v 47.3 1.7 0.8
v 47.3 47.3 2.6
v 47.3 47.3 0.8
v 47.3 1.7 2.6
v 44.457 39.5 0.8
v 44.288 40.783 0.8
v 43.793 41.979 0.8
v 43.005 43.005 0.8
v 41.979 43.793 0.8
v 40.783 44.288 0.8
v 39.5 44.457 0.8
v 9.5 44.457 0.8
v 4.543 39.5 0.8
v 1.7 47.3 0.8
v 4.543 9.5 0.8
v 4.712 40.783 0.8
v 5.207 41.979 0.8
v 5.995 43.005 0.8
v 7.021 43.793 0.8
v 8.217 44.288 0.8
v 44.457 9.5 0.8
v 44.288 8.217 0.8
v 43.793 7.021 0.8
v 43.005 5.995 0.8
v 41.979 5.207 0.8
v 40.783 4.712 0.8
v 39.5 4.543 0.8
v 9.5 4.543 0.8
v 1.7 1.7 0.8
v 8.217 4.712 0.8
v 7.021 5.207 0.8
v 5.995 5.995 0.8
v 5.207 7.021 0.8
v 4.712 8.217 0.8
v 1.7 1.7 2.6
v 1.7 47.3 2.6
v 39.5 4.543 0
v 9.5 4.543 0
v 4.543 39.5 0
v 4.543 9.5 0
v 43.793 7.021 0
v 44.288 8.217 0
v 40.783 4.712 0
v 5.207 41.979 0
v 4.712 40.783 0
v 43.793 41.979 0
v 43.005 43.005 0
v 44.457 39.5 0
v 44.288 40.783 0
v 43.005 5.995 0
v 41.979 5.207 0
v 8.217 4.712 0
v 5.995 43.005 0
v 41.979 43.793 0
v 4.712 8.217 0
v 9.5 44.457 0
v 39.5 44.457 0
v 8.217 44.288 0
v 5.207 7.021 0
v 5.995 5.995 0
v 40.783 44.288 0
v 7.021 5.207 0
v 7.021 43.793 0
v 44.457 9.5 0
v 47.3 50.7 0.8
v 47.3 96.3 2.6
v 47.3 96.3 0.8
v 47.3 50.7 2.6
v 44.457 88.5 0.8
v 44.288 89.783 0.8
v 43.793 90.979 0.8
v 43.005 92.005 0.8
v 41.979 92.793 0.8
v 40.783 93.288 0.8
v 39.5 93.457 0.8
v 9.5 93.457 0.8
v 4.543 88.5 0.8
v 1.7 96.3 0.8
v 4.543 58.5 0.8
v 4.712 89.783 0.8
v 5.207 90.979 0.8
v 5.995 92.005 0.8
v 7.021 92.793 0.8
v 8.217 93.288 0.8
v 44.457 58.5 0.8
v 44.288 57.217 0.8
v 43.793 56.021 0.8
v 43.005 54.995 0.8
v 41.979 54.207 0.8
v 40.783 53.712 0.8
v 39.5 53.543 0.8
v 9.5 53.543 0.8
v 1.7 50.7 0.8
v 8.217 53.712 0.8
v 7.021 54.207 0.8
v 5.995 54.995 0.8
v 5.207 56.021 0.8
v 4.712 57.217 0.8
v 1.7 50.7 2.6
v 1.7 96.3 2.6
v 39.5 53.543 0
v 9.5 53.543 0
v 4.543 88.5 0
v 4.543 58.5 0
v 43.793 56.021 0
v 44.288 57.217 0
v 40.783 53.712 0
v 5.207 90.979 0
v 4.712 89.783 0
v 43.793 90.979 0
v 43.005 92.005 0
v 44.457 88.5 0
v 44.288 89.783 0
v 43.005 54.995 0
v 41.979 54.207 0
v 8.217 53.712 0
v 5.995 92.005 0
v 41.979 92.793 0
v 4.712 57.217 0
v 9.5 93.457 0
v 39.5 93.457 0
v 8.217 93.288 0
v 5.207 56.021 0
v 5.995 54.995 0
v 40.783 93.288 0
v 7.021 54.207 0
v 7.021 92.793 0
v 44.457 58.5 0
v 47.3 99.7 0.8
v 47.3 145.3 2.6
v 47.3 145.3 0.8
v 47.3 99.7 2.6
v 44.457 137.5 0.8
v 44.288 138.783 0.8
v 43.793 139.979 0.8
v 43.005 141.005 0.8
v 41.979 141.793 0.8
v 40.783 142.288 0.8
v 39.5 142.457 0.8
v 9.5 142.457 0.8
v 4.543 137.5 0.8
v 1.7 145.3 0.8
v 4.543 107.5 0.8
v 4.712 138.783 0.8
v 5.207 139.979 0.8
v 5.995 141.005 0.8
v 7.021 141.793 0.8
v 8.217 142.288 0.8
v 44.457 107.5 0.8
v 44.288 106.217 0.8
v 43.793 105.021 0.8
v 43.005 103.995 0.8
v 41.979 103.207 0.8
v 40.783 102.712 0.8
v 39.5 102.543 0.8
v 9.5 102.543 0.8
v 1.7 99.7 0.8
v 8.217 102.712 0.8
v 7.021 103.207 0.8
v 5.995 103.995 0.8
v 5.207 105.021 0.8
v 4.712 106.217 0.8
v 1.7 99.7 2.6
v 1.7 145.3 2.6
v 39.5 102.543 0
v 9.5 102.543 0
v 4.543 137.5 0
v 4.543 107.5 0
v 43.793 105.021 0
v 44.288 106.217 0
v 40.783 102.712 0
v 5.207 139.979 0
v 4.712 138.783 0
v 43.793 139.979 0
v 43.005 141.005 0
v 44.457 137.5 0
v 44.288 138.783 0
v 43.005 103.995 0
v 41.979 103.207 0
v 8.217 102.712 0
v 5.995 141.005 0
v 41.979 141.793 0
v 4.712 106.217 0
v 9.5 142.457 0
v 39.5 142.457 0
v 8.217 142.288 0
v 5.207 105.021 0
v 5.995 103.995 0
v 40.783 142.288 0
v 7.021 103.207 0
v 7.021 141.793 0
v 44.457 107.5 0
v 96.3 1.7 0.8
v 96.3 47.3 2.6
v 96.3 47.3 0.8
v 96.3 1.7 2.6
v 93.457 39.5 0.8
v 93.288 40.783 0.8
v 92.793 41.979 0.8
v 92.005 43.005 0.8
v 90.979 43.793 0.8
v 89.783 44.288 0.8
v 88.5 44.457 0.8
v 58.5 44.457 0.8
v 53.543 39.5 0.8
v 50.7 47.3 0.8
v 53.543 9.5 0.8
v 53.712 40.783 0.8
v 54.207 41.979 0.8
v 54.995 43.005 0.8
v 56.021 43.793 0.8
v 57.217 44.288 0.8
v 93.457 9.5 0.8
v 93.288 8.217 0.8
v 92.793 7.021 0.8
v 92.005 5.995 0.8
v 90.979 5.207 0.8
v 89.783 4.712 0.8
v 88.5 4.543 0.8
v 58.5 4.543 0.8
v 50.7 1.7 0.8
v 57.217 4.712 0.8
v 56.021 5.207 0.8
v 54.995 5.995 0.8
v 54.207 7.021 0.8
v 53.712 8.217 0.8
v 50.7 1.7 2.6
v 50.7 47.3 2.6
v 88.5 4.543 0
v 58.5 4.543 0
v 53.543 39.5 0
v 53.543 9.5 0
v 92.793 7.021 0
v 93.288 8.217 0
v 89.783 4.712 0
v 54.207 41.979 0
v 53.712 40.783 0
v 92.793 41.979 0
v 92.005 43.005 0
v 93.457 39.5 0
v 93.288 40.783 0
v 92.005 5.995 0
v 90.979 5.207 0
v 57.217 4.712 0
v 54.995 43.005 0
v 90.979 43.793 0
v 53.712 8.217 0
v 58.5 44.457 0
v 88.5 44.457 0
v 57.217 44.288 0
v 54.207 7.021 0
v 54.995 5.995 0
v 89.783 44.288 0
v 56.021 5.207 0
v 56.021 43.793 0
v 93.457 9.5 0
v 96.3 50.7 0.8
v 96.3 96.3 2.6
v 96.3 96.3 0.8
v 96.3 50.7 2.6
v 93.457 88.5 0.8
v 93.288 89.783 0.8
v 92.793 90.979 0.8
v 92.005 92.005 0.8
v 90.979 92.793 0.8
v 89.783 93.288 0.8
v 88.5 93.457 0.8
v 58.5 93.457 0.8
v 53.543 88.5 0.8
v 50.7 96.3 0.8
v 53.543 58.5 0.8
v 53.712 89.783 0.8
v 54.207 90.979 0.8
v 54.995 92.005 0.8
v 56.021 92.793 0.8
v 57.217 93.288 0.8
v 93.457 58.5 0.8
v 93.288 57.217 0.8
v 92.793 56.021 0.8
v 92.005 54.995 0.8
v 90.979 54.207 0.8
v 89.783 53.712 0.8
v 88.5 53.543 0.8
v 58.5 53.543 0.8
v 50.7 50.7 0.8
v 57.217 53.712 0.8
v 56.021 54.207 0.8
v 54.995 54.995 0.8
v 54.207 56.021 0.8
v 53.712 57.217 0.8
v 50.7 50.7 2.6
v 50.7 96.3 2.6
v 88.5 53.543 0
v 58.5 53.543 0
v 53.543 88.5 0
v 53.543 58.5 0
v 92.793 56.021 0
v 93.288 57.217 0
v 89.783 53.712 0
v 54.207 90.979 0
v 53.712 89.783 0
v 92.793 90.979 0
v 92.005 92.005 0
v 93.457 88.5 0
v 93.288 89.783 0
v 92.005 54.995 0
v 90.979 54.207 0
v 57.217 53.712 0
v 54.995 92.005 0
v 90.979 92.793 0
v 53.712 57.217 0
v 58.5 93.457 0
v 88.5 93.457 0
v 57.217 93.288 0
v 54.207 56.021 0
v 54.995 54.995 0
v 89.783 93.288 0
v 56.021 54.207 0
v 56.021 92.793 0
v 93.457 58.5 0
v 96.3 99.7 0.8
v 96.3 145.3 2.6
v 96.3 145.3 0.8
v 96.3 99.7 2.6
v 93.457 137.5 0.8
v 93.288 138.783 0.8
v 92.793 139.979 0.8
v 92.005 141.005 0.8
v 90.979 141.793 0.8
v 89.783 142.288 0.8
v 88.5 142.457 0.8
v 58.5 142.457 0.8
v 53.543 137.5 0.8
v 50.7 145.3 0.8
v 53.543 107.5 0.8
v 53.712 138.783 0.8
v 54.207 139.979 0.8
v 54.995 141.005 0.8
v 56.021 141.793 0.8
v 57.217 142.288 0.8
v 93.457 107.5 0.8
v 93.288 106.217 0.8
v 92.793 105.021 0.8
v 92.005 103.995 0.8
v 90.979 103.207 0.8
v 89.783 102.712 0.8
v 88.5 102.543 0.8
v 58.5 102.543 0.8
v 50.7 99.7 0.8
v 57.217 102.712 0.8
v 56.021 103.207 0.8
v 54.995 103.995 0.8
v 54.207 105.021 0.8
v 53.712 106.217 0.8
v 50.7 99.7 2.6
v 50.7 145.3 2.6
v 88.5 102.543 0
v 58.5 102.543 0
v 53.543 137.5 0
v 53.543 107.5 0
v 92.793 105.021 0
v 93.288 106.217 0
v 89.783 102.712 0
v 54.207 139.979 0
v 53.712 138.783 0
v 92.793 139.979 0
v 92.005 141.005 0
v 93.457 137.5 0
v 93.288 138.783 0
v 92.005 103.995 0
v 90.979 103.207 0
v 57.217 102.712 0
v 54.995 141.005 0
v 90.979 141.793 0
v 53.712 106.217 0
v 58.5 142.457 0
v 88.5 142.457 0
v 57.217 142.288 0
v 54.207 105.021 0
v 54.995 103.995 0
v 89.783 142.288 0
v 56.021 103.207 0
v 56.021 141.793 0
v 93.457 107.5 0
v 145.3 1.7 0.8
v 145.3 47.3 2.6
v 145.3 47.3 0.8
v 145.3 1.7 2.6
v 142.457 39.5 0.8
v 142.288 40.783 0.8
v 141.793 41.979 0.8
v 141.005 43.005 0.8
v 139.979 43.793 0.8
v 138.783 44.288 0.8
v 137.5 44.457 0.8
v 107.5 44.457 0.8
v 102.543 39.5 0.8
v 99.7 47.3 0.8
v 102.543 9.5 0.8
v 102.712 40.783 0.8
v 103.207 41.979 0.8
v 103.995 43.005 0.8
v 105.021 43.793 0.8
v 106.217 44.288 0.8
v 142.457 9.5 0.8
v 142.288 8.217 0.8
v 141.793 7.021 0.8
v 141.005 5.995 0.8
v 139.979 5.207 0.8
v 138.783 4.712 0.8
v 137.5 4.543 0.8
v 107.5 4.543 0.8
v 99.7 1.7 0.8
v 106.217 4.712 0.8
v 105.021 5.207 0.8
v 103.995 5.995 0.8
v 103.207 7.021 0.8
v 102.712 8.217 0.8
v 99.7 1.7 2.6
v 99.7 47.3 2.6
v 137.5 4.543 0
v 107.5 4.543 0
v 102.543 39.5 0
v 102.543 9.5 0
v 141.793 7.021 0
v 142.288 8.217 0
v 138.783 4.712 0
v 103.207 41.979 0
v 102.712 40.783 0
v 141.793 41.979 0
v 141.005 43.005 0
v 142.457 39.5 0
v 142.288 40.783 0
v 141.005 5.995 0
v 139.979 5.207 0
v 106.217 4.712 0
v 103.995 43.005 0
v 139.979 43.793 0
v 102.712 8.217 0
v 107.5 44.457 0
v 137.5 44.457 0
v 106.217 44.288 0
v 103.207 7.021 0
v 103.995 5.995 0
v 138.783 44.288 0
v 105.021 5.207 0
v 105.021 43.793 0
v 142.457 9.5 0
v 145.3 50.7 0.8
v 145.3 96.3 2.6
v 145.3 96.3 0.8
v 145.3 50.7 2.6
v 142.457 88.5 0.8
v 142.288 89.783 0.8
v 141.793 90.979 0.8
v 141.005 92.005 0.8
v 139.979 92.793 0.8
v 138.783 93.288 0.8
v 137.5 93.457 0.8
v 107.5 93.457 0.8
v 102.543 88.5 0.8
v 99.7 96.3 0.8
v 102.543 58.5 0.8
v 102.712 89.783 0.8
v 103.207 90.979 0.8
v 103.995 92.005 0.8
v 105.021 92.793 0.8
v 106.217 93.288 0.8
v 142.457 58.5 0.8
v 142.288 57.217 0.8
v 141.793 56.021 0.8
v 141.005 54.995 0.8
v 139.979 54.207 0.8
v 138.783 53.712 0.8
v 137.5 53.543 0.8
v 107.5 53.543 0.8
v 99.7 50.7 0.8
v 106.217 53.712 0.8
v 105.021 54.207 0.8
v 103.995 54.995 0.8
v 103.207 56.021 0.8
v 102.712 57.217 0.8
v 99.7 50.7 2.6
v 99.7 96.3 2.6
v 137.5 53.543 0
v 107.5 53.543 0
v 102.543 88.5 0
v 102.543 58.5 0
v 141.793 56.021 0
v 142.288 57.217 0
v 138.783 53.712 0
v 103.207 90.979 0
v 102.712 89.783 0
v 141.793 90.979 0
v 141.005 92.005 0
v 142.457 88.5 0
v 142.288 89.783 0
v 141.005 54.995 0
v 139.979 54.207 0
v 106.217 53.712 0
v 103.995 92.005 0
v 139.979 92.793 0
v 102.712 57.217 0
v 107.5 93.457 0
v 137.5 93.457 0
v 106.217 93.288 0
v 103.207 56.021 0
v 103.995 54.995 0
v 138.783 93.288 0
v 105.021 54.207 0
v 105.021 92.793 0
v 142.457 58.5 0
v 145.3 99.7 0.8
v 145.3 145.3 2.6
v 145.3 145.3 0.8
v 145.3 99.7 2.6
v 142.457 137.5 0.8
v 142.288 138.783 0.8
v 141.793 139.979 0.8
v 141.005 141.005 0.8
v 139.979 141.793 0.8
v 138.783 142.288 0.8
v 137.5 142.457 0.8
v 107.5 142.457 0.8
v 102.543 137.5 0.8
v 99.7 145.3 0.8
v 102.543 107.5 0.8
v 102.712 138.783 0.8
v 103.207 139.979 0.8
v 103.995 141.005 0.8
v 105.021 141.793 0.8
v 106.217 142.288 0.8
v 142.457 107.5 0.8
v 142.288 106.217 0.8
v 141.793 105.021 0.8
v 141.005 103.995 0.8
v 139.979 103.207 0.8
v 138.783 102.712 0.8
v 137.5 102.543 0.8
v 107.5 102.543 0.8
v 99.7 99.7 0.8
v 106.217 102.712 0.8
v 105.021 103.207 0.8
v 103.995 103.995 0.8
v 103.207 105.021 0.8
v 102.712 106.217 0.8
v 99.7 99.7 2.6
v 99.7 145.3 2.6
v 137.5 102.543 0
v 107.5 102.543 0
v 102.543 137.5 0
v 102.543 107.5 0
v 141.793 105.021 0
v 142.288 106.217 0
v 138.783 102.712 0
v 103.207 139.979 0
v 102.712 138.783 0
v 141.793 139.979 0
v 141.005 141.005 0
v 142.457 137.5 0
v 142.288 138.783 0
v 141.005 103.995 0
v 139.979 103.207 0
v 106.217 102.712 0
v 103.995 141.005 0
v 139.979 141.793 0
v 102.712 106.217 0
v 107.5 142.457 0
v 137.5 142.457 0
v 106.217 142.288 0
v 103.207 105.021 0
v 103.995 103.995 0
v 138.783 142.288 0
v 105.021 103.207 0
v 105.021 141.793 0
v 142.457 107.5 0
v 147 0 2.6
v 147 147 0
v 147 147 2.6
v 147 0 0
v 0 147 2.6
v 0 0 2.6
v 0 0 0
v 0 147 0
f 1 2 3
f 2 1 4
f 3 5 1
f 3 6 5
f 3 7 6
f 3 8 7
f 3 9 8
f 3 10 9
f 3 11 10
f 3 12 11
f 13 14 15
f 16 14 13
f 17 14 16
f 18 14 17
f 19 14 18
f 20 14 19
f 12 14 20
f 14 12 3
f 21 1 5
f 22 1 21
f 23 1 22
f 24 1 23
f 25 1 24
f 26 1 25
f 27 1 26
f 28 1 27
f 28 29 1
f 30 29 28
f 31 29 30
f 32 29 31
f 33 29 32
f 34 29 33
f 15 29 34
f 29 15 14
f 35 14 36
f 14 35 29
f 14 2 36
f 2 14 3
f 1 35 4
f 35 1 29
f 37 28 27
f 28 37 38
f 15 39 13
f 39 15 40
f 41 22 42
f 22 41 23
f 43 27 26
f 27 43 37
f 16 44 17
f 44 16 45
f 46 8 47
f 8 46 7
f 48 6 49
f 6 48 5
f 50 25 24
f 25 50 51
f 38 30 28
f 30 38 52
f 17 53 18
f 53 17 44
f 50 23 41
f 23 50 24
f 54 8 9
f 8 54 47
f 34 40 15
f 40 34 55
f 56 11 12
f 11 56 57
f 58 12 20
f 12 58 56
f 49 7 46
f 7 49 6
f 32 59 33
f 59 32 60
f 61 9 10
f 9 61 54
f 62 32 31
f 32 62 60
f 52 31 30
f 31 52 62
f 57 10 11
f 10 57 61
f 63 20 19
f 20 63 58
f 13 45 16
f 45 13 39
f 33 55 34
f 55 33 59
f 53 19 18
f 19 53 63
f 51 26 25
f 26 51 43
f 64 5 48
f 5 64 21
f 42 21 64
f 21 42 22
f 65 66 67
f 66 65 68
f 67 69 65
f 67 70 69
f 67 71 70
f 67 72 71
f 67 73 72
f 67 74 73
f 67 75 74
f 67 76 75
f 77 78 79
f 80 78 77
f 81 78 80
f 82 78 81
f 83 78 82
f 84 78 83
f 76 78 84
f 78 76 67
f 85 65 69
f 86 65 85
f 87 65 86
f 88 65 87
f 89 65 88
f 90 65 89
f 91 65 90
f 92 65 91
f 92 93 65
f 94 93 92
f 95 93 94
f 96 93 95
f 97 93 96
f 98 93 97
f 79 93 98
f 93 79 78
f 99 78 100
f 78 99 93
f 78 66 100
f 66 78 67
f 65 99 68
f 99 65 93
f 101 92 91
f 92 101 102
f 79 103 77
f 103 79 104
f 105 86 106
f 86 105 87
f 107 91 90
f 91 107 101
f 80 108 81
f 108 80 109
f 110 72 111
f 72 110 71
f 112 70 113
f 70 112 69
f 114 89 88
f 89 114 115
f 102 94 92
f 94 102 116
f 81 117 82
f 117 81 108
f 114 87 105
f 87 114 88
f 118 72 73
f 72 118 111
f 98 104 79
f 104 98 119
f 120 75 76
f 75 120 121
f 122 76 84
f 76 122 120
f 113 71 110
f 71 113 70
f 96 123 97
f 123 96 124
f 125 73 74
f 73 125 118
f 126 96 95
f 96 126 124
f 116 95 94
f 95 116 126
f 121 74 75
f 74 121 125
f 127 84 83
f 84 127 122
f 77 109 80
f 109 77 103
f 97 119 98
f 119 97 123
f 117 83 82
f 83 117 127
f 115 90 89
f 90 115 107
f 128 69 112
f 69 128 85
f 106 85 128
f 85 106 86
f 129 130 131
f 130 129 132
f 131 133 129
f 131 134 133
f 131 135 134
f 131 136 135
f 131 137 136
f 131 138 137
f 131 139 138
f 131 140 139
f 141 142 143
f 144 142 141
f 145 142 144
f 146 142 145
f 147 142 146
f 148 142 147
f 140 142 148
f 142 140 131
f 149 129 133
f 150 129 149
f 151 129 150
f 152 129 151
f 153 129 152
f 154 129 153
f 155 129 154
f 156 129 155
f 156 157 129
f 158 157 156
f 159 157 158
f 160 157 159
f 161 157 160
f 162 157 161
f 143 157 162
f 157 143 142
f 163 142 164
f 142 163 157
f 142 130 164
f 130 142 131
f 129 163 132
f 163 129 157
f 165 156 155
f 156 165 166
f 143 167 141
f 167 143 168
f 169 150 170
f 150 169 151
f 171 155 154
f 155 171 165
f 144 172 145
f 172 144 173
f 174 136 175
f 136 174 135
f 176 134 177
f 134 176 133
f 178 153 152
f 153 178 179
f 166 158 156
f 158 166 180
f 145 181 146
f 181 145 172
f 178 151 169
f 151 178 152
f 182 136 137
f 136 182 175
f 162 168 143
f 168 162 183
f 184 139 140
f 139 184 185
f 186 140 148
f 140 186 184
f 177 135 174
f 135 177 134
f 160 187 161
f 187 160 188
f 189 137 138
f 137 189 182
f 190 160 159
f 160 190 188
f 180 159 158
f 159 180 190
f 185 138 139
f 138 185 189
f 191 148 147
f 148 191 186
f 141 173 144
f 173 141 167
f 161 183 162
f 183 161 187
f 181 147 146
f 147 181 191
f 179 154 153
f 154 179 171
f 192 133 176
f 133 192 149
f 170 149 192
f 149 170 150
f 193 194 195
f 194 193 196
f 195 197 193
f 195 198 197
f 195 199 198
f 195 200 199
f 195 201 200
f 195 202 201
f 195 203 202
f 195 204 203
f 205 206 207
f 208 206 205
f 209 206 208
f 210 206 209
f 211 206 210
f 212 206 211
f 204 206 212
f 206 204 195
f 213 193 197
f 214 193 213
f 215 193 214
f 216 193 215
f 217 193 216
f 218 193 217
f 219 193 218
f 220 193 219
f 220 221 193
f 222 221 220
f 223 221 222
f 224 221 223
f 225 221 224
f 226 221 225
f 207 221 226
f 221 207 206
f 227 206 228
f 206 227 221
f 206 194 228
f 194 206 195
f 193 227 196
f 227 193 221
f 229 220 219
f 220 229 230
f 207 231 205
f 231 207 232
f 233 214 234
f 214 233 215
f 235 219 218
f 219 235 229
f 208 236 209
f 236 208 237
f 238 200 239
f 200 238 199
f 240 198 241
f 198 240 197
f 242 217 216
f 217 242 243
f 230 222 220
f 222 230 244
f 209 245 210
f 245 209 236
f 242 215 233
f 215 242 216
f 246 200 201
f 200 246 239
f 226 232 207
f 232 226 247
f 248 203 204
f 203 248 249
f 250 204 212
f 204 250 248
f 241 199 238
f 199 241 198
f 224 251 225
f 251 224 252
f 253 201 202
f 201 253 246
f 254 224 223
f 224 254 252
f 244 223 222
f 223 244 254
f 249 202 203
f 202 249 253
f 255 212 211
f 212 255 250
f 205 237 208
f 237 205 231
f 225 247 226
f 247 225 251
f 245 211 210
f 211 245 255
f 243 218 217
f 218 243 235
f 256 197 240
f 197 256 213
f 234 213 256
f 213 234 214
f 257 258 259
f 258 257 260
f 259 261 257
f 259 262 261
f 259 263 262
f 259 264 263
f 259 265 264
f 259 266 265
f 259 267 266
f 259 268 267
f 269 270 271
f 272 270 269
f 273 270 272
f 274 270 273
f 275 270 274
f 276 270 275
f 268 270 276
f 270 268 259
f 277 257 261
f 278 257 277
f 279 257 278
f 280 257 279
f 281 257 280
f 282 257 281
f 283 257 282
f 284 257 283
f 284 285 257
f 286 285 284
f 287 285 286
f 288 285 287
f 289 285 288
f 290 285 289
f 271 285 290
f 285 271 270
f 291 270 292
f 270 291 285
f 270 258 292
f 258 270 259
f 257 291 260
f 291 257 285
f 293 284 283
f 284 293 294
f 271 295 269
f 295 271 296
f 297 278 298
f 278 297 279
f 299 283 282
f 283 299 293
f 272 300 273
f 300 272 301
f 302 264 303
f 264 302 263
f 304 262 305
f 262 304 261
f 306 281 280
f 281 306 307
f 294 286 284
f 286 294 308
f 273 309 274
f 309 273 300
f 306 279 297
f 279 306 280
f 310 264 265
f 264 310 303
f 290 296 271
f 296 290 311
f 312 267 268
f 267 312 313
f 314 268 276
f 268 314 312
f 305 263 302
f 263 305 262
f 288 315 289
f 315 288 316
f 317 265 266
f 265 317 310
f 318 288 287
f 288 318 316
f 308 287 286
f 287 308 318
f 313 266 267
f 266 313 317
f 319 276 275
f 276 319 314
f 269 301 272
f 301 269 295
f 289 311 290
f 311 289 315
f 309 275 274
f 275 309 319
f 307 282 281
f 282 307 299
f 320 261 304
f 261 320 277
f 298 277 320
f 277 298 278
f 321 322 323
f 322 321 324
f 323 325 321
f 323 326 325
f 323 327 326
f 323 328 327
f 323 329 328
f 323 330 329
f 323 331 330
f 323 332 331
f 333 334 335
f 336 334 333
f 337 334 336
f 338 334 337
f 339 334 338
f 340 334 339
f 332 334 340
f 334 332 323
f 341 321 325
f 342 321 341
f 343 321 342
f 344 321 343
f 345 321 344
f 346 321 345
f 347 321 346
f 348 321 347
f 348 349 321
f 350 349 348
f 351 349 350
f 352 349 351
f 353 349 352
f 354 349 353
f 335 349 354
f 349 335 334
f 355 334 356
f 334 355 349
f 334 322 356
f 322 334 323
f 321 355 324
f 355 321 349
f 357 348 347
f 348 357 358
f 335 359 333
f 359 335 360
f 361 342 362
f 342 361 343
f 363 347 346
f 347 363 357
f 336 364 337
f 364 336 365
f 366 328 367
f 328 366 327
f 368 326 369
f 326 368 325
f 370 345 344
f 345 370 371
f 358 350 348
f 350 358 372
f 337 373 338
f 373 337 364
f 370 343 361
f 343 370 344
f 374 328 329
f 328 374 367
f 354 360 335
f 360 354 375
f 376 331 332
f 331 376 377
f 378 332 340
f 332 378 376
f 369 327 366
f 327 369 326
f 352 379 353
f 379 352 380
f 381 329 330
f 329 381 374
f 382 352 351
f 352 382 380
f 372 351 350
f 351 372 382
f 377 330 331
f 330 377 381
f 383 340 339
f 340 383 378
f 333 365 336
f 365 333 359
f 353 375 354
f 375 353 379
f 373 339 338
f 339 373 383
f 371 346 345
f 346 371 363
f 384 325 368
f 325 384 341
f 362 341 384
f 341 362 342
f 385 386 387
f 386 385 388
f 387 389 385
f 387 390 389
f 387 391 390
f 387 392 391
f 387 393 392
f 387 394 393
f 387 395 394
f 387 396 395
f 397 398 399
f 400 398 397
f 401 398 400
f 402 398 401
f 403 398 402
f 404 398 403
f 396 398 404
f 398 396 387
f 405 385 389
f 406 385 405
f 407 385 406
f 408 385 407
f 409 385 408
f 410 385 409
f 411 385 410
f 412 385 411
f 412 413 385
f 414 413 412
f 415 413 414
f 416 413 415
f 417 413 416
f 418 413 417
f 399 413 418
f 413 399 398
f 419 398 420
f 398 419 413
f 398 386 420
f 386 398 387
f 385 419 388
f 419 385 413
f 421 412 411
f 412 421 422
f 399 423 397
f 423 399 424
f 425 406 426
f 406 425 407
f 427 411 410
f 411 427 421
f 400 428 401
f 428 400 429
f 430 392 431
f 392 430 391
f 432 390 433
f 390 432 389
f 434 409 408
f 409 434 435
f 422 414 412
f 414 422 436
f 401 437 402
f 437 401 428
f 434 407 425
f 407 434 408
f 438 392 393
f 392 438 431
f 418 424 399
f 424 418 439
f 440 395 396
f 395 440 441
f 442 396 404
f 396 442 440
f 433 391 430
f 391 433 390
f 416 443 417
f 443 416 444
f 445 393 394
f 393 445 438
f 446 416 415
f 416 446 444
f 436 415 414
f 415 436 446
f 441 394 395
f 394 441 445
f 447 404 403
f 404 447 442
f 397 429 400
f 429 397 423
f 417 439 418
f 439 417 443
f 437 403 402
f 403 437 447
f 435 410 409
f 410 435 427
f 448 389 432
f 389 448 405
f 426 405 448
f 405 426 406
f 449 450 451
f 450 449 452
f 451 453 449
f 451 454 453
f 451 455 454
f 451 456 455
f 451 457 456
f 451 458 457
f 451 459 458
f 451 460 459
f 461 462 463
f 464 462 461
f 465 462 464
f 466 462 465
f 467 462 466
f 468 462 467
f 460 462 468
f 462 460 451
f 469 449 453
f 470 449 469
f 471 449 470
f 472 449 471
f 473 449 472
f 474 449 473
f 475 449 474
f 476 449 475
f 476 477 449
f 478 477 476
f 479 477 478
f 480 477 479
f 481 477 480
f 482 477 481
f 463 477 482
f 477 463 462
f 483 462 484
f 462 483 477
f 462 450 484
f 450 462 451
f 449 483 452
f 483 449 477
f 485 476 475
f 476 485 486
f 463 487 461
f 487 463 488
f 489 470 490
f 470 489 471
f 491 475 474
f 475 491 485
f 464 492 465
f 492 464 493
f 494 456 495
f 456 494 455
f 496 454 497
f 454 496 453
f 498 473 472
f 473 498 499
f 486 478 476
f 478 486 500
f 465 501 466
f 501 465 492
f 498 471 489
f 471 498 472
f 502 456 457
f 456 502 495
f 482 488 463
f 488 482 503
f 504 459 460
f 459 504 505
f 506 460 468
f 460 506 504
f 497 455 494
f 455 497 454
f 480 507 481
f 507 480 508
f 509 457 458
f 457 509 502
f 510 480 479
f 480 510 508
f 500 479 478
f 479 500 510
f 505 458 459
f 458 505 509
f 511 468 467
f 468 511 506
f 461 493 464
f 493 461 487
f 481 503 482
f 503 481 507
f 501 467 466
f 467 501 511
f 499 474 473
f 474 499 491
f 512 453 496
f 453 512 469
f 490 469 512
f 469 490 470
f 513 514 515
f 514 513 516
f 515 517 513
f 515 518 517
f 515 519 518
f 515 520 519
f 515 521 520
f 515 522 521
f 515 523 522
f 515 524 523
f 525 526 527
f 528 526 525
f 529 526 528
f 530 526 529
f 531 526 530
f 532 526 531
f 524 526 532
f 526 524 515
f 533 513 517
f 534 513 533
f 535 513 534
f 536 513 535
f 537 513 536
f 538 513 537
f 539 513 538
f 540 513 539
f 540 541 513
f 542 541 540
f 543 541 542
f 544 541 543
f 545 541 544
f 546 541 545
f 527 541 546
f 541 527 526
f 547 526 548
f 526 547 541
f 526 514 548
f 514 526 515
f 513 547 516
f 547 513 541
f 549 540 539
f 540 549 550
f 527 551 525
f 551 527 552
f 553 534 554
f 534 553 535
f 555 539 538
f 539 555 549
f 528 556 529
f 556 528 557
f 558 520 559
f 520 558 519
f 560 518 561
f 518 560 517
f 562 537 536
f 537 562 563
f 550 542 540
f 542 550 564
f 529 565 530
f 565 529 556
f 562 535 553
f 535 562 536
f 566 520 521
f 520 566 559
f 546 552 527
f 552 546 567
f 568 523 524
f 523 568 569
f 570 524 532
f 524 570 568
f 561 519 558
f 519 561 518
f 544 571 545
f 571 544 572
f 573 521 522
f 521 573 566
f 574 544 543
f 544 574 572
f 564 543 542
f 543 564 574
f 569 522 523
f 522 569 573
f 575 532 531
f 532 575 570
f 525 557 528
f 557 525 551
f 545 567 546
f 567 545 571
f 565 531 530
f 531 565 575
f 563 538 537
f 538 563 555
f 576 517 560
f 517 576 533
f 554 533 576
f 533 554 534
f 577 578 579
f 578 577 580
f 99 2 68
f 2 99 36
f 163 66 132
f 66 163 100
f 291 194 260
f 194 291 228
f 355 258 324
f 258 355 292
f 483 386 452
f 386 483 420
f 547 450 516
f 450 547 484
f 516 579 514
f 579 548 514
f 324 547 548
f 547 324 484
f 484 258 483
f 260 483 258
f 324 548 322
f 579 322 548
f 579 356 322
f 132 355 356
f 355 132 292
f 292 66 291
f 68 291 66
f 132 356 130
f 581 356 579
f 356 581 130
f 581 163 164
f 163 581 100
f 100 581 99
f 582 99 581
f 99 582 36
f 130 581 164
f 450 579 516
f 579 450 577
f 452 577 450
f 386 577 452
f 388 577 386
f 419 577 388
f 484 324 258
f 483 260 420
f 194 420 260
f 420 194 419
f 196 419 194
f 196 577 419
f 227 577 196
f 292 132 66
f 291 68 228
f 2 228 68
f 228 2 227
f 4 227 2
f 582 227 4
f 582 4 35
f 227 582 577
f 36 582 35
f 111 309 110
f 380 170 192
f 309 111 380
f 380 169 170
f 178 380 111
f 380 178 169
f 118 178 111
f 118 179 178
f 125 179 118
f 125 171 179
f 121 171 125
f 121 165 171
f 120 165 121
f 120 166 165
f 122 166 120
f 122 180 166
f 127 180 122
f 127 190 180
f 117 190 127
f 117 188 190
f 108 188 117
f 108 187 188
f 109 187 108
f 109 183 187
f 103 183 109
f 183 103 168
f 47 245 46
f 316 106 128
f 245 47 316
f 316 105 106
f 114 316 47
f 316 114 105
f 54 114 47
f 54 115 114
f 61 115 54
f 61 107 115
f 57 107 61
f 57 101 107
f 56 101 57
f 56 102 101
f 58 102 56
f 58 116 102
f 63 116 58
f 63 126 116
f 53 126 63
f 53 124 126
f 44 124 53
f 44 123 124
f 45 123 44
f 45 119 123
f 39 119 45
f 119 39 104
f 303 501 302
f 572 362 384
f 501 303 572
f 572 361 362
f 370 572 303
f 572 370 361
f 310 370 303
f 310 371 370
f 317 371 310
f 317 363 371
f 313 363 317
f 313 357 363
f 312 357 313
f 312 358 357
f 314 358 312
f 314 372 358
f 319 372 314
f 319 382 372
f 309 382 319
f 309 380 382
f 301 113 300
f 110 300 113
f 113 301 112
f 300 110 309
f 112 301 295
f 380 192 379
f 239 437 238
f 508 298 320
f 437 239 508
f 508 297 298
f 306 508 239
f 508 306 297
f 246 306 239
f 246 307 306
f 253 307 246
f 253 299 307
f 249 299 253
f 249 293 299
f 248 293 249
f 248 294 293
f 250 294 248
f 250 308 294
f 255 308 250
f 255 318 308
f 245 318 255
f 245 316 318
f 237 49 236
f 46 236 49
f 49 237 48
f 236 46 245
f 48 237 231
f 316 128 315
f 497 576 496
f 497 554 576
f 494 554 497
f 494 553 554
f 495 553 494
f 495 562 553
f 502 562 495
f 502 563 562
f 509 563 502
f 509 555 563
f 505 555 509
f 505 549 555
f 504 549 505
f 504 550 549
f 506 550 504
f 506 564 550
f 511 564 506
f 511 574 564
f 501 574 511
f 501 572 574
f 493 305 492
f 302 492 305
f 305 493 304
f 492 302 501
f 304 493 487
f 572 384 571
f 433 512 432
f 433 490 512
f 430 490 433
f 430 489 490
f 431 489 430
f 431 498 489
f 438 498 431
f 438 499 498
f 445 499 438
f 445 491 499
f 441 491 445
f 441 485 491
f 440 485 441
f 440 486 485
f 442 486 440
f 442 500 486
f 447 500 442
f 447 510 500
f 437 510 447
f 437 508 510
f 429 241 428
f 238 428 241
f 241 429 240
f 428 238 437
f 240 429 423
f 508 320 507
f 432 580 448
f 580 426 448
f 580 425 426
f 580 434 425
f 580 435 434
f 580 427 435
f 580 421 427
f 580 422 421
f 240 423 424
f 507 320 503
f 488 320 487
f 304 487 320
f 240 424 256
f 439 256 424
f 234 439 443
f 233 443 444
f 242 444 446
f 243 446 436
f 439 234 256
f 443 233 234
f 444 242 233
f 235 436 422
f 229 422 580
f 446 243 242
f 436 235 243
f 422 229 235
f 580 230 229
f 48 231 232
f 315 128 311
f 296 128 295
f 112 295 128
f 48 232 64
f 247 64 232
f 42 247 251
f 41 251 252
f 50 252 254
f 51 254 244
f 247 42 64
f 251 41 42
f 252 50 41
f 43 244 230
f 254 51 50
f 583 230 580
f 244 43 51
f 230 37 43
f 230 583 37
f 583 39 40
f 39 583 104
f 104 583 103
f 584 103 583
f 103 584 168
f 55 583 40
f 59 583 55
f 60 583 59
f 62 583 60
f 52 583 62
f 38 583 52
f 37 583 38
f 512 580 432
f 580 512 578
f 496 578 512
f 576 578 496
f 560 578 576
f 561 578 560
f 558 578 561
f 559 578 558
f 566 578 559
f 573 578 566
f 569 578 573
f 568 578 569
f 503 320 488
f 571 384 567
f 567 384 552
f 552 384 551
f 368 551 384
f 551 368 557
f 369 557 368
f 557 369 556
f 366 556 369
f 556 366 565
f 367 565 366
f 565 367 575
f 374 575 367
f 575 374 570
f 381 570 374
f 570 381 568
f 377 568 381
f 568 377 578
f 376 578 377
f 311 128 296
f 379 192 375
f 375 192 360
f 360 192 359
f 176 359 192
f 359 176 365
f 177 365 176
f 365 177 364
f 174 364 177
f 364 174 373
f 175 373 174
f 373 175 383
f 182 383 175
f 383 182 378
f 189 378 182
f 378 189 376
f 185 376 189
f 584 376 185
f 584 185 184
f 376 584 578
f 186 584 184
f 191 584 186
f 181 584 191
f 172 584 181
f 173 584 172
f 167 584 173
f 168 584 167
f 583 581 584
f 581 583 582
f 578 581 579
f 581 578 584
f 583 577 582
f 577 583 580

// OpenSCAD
// file: includes/Store Hero Calculations.scad
function base_size_length_reduced() = BASE_SIZE_LENGTH - 2 * BASE_SIZE_REDUCTION;
function base_size_width_reduced() = BASE_SIZE_WIDTH - 2 * BASE_SIZE_REDUCTION;
function length() = LENGTH_UNITS * BASE_SIZE_LENGTH;
function width() = WIDTH_UNITS * BASE_SIZE_WIDTH;
function length_reduced() = length() - 2 * BASE_SIZE_REDUCTION;
function width_reduced() = width() - 2 * BASE_SIZE_REDUCTION;
function length_inner() = length() - 2 * WALL_THICKNESS;
function width_inner() = width() - 2 * WALL_THICKNESS;
function length_inner_reduced() = length_reduced() - 2 * WALL_THICKNESS;
function width_inner_reduced() = width_reduced() - 2 * WALL_THICKNESS;
function height_total() = (BASE_HEIGHT * HEIGHT_UNITS) - (FOOT_HEIGHT * (HEIGHT_UNITS - 1));
function height_wall() = height_total() - (FOOT_HEIGHT + FOOT_TO_WALL_Z_SIZE);
function length_foot() = base_size_length_reduced() - 2 * FOOT_TO_WALL_XY_SIZE;
function width_foot() =  base_size_width_reduced() - 2 * FOOT_TO_WALL_XY_SIZE;
function length_grid_cell() = length_foot() + 2 * GRID_WALL_TOLERANCE;
function width_grid_cell() = width_foot() + 2 * GRID_WALL_TOLERANCE;
function grid_cell_hole_inset_length() = GRID_HOLE_SIZE_SPACING / 2;
function grid_cell_hole_inset_width() = GRID_HOLE_SIZE_SPACING / 2;
function wall_z() = FOOT_HEIGHT + FOOT_TO_WALL_Z_SIZE;
function grid_wall_thickness() = (BASE_SIZE - length_grid_cell()) / 2;
function spacer_spacing() = grid_wall_thickness();
function spacer_min_width() = 2 * spacer_spacing() + SPACER_CUTOUT_MIN_WIDTH;
function display_width() = length_inner() - 2 * DISPLAY_SPACING;
// file: includes/Store Hero Utilities.scad
module rounded_square(dimensions, r, center = false) {
    x = dimensions[0];
    y = dimensions[1];
    translate([center ? 0 : r, center ? 0 : r, 0])
        minkowski() {
            square([x - 2 * r, y - 2 * r], center);
            circle(r = r);
        }
}

module rounded_cube(dimensions, r, center = false) {
    x = dimensions[0];
    y = dimensions[1];
    z = dimensions[2];
    translate([center ? - x / 2 : 0, center ? - y / 2 : 0, center ? - z / 2 : 0])
        hull() {
            translate([r, r, r]) sphere(r = r);
            translate([x - r, r, r]) sphere(r = r);
            translate([x - r, y - r, r]) sphere(r = r);
            translate([r, y - r, r]) sphere(r = r);
            translate([r, r, z - r]) sphere(r = r);
            translate([x - r, r, z - r]) sphere(r = r);
            translate([x - r, y - r, z - r]) sphere(r = r);
            translate([r, y - r, z - r]) sphere(r = r);
        }
}
// file: includes/Store Hero Variables.scad
RENDER_HELPER = 0.01;

BASE_SIZE = 49;
BASE_SIZE_LENGTH = BASE_SIZE;
BASE_SIZE_WIDTH = BASE_SIZE;
BASE_SIZE_REDUCTION = 0.5;
BASE_HEIGHT = 36.25;

WALL_THICKNESS = 1.4;
WALL_CORNER_ROUNDING_RADIUS_OUTER = 4;
WALL_CORNER_ROUNDING_RADIUS_INNER = 2;

FOOT_HEIGHT = 1.8;
FOOT_TOLERANCE = 0.8;
FOOT_TO_WALL_SIZE = WALL_THICKNESS + FOOT_TOLERANCE - BASE_SIZE_REDUCTION;
FOOT_TO_WALL_XY_SIZE = FOOT_TO_WALL_SIZE;
FOOT_TO_WALL_Z_SIZE = FOOT_TO_WALL_SIZE;
FOOT_CORNER_ROUNDING_RADIUS = 4;
FLOOR_THICKNESS = WALL_THICKNESS;
FOOT_CHAMFER_SIZE = 0;

DISPLAY_ROUNDING_RADIUS = 2;
DISPLAY_DEPTH = 6;
DISPLAY_HEIGHT = 15;
DISPLAY_Z_INSET = FOOT_HEIGHT + FOOT_TO_WALL_Z_SIZE + 0.5;
DISPLAY_SPACING = 2;

GRID_FLOOR_THICKNESS = 0.8;
GRID_WALL_HEIGHT = FOOT_HEIGHT;
GRID_WALL_TOLERANCE = 0.5;
GRID_HOLE_SIZE_SPACING = 9;
GRID_HOLE_ROUNDING_RADIUS = 5;

SPACER_CUTOUT_MIN_WIDTH = 4;
SPACER_ROUNDING_RADIUS = SPACER_CUTOUT_MIN_WIDTH / 2;
// main file
////////////////////////////////////////////////////////////////////////////////
// ### CUSTOMIZABLE VARIABLES
////////////////////////////////////////////////////////////////////////////////
// Length factor: The length will be 49 x LENGTH_UNITS
LENGTH_UNITS = 3;
// Width factor: The width will be 49 x WIDTH_UNITS
WIDTH_UNITS = 3;
// Spacer side A
SPACER_A = 0;
// Spacer side B
SPACER_B = 0;
// Spacer side C
SPACER_C = 0;
// Spacer side D
SPACER_D = 0;

module __Customizer_Limit__() {}


////////////////////////////////////////////////////////////////////////////////
// ### OPENSCAD SPECIAL VARIABLES
////////////////////////////////////////////////////////////////////////////////
$fn = 24;


////////////////////////////////////////////////////////////////////////////////
// ### GLOBAL VARIABLES
////////////////////////////////////////////////////////////////////////////////
include <includes/Store Hero Variables.scad>


////////////////////////////////////////////////////////////////////////////////
// ### UTILITY MODULES
////////////////////////////////////////////////////////////////////////////////
include <includes/Store Hero Utilities.scad>


////////////////////////////////////////////////////////////////////////////////
// ### CALCULATION FUNCTIONS
////////////////////////////////////////////////////////////////////////////////
include <includes/Store Hero Calculations.scad>

function length_grid() = BASE_SIZE_LENGTH * LENGTH_UNITS + SPACER_B + SPACER_D;
function width_grid() = BASE_SIZE_WIDTH * WIDTH_UNITS + SPACER_A + SPACER_C;


////////////////////////////////////////////////////////////////////////////////
// ### MAIN RENDERING
////////////////////////////////////////////////////////////////////////////////
main();


////////////////////////////////////////////////////////////////////////////////
// ### MODULES
////////////////////////////////////////////////////////////////////////////////
module main() {
    difference() {
        base_plate();
        cutouts();
    }
//    translate([0, 0, 3]) cutouts_spacers();
}

module base_plate() {
    cube([length_grid(), width_grid(), GRID_FLOOR_THICKNESS + GRID_WALL_HEIGHT]);
}

module cutouts() {
    cutouts_cells();
    cutouts_spacers();
}

module cutouts_cells() {
    translate([SPACER_D, SPACER_C, 0]) {
        for (i = [0 : LENGTH_UNITS - 1]) {
            for (j = [0 : WIDTH_UNITS - 1]) {
                translate([i * BASE_SIZE_LENGTH, j * BASE_SIZE_WIDTH, 0])
                    cutouts_cell();
            }
        }
    }
}

module cutouts_cell() {
    translate([(BASE_SIZE_LENGTH - length_grid_cell()) / 2, (BASE_SIZE_WIDTH - width_grid_cell()) / 2, GRID_FLOOR_THICKNESS])
        cube([length_grid_cell(), width_grid_cell(), GRID_WALL_HEIGHT + RENDER_HELPER]);
    translate([grid_cell_hole_inset_length(), grid_cell_hole_inset_width(), 0])
        rounded_cube([BASE_SIZE_LENGTH - GRID_HOLE_SIZE_SPACING, BASE_SIZE_WIDTH - GRID_HOLE_SIZE_SPACING, GRID_FLOOR_THICKNESS], GRID_HOLE_ROUNDING_RADIUS);
}

module cutouts_spacers() {
    if (SPACER_A >= spacer_min_width())
        translate([0, width_grid() - SPACER_A, 0])
            cutouts_spacer(length_grid(), SPACER_A);
    if (SPACER_B >= spacer_min_width())
        translate([length_grid() - spacer_spacing(), SPACER_C, 0])
            rotate([0, 0, 90])
                cutouts_spacer(width(), SPACER_B);
    if (SPACER_C >= spacer_min_width())
        translate([0, spacer_spacing(), 0])
            cutouts_spacer(length_grid(), SPACER_C);
    if (SPACER_D >= spacer_min_width())
        translate([SPACER_D, SPACER_C, 0])
            rotate([0, 0, 90])
                cutouts_spacer(width(), SPACER_D);
}

module cutouts_spacer(l, w) {
    nr_spacers = floor((l - spacer_spacing()) / BASE_SIZE);
    spacer_length = (l - spacer_spacing()) / nr_spacers - spacer_spacing();
    spacer_width = w - spacer_spacing();
    translate([spacer_spacing(), 0, - RENDER_HELPER])
        linear_extrude(GRID_FLOOR_THICKNESS + GRID_WALL_HEIGHT + 2 * RENDER_HELPER)
            for (i = [0 : nr_spacers - 1]) {
                translate([i * (spacer_length + spacer_spacing()), 0, 0])
                    rounded_square([spacer_length, spacer_width], SPACER_ROUNDING_RADIUS);
            }
}
